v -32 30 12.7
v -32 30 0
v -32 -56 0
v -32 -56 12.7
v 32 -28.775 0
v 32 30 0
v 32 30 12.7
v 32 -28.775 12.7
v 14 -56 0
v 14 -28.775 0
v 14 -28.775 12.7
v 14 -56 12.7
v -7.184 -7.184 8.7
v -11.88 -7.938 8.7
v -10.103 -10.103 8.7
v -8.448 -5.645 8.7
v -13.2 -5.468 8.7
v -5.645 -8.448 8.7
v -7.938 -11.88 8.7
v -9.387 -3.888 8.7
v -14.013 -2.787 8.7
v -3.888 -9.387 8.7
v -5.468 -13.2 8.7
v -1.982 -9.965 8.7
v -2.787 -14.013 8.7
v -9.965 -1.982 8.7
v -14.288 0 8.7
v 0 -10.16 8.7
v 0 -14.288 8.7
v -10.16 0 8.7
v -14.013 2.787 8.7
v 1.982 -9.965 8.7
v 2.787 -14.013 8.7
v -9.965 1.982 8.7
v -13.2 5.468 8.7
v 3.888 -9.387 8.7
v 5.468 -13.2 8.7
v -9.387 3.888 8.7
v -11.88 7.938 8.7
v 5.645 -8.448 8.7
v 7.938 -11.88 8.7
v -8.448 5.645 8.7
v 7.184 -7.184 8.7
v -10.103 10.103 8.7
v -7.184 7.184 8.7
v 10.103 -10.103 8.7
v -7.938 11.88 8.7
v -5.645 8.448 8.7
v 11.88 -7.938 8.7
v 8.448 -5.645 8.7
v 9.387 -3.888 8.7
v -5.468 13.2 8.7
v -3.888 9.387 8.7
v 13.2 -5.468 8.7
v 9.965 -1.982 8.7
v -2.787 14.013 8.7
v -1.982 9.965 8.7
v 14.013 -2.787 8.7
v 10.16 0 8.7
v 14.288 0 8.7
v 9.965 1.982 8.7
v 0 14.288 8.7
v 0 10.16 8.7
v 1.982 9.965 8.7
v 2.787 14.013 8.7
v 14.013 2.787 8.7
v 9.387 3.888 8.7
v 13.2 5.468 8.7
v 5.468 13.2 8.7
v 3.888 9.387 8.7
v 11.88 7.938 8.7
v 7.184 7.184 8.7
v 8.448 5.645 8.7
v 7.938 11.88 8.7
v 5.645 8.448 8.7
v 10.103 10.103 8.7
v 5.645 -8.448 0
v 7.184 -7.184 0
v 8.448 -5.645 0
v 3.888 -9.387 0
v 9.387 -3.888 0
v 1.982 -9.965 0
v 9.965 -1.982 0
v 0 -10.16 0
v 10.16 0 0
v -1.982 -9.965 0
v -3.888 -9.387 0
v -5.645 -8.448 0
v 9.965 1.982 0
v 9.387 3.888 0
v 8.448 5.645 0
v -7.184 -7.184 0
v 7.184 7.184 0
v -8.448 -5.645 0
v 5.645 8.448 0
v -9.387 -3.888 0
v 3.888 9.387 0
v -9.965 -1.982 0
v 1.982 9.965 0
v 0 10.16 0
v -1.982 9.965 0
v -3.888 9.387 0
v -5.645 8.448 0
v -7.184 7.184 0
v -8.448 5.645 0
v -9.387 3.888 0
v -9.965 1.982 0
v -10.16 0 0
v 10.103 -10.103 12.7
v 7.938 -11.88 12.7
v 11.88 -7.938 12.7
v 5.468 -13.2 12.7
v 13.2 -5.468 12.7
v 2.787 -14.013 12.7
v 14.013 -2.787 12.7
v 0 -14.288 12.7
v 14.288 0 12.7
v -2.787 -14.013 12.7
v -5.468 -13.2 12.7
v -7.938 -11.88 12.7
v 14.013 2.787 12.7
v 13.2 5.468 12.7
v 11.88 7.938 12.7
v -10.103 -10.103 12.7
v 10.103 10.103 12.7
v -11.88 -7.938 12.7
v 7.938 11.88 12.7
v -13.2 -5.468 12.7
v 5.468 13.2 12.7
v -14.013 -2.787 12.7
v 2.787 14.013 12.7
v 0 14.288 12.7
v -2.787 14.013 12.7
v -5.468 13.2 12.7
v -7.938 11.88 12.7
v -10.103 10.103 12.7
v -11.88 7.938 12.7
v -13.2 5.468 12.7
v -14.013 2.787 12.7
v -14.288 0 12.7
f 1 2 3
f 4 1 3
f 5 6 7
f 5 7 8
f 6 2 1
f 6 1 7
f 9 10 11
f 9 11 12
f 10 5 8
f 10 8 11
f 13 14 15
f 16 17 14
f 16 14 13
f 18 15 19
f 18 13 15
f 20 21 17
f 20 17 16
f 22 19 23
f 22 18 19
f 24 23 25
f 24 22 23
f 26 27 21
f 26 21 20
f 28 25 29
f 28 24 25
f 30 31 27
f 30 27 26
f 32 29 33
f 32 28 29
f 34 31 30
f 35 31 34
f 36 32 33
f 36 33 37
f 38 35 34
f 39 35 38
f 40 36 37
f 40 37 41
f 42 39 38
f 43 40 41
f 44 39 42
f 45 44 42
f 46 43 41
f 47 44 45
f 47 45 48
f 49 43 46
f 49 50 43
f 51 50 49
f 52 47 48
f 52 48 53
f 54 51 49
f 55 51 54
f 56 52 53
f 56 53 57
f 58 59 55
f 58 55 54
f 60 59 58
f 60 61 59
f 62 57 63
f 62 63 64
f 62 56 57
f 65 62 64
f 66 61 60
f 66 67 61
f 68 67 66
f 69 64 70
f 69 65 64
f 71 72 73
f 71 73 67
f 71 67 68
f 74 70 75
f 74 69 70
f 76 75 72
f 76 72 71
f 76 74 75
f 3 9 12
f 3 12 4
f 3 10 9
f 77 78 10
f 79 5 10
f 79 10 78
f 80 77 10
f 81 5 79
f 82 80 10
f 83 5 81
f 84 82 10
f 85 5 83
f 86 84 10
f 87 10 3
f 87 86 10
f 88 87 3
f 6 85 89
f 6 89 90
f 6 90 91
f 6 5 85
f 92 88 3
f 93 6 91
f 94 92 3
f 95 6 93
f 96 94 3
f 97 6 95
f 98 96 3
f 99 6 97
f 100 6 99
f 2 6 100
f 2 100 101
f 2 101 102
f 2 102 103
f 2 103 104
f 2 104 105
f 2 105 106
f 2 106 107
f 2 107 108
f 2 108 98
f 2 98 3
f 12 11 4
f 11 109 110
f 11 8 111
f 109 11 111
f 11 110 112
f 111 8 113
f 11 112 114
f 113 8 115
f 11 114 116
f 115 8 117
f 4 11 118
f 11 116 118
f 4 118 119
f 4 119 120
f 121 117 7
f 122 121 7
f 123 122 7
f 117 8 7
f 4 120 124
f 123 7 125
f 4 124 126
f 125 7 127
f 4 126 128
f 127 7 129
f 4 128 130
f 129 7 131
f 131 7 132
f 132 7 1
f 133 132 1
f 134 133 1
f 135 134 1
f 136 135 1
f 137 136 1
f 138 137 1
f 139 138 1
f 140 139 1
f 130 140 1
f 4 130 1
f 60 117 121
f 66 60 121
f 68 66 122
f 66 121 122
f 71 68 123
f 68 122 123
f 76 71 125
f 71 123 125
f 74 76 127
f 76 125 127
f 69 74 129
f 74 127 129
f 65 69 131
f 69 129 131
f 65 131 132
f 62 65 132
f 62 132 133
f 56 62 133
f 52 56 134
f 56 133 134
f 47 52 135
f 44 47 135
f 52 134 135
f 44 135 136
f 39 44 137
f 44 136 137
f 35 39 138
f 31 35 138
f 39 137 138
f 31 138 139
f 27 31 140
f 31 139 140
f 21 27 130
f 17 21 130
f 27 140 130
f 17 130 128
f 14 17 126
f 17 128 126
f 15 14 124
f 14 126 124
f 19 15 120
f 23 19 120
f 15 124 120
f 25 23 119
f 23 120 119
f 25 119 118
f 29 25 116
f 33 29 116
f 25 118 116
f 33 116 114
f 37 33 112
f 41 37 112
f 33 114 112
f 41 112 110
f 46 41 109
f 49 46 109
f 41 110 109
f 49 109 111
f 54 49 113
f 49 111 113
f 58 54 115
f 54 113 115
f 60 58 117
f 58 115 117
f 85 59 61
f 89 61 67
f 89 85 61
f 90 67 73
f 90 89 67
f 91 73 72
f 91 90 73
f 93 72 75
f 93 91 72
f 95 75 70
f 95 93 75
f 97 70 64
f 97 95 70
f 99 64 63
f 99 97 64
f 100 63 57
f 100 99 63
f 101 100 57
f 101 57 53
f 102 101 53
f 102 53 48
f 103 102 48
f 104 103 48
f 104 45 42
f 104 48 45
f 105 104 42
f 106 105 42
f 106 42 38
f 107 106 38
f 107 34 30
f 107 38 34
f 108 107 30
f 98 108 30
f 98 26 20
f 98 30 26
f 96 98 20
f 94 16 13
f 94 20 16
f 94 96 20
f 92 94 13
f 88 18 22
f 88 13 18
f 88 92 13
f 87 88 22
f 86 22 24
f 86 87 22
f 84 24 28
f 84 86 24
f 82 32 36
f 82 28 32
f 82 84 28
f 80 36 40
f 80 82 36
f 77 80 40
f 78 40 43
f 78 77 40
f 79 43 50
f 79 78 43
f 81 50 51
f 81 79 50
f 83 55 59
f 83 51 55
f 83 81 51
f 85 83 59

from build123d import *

# Parameters (mm, degrees)
SKETCH1_R           = 10.16
BOSS_EXTRUDE1_DEPTH = 12.7
CUT_EXTRUDE1_START  = 12.7
SKETCH2_R           = 14.2875
CUT_EXTRUDE1_DEPTH  = 4


with BuildPart() as part:
    # Sketch1 → Boss-Extrude1 (new body)
    with BuildSketch(Plane.XY):
        Polygon((14, -56), (-32, -56), (-32, 0), (-32, 30), (32, 30), (32, -28.77498914), (14, -28.77498914), align=None)
        Circle(SKETCH1_R, mode=Mode.SUBTRACT)
    extrude(amount=BOSS_EXTRUDE1_DEPTH)

    # Sketch2 → Cut-Extrude1 (cut)
    with BuildSketch(Plane.XY.offset(CUT_EXTRUDE1_START)):
        Circle(SKETCH2_R)
    extrude(amount=-CUT_EXTRUDE1_DEPTH, mode=Mode.SUBTRACT)


solid = part.part
